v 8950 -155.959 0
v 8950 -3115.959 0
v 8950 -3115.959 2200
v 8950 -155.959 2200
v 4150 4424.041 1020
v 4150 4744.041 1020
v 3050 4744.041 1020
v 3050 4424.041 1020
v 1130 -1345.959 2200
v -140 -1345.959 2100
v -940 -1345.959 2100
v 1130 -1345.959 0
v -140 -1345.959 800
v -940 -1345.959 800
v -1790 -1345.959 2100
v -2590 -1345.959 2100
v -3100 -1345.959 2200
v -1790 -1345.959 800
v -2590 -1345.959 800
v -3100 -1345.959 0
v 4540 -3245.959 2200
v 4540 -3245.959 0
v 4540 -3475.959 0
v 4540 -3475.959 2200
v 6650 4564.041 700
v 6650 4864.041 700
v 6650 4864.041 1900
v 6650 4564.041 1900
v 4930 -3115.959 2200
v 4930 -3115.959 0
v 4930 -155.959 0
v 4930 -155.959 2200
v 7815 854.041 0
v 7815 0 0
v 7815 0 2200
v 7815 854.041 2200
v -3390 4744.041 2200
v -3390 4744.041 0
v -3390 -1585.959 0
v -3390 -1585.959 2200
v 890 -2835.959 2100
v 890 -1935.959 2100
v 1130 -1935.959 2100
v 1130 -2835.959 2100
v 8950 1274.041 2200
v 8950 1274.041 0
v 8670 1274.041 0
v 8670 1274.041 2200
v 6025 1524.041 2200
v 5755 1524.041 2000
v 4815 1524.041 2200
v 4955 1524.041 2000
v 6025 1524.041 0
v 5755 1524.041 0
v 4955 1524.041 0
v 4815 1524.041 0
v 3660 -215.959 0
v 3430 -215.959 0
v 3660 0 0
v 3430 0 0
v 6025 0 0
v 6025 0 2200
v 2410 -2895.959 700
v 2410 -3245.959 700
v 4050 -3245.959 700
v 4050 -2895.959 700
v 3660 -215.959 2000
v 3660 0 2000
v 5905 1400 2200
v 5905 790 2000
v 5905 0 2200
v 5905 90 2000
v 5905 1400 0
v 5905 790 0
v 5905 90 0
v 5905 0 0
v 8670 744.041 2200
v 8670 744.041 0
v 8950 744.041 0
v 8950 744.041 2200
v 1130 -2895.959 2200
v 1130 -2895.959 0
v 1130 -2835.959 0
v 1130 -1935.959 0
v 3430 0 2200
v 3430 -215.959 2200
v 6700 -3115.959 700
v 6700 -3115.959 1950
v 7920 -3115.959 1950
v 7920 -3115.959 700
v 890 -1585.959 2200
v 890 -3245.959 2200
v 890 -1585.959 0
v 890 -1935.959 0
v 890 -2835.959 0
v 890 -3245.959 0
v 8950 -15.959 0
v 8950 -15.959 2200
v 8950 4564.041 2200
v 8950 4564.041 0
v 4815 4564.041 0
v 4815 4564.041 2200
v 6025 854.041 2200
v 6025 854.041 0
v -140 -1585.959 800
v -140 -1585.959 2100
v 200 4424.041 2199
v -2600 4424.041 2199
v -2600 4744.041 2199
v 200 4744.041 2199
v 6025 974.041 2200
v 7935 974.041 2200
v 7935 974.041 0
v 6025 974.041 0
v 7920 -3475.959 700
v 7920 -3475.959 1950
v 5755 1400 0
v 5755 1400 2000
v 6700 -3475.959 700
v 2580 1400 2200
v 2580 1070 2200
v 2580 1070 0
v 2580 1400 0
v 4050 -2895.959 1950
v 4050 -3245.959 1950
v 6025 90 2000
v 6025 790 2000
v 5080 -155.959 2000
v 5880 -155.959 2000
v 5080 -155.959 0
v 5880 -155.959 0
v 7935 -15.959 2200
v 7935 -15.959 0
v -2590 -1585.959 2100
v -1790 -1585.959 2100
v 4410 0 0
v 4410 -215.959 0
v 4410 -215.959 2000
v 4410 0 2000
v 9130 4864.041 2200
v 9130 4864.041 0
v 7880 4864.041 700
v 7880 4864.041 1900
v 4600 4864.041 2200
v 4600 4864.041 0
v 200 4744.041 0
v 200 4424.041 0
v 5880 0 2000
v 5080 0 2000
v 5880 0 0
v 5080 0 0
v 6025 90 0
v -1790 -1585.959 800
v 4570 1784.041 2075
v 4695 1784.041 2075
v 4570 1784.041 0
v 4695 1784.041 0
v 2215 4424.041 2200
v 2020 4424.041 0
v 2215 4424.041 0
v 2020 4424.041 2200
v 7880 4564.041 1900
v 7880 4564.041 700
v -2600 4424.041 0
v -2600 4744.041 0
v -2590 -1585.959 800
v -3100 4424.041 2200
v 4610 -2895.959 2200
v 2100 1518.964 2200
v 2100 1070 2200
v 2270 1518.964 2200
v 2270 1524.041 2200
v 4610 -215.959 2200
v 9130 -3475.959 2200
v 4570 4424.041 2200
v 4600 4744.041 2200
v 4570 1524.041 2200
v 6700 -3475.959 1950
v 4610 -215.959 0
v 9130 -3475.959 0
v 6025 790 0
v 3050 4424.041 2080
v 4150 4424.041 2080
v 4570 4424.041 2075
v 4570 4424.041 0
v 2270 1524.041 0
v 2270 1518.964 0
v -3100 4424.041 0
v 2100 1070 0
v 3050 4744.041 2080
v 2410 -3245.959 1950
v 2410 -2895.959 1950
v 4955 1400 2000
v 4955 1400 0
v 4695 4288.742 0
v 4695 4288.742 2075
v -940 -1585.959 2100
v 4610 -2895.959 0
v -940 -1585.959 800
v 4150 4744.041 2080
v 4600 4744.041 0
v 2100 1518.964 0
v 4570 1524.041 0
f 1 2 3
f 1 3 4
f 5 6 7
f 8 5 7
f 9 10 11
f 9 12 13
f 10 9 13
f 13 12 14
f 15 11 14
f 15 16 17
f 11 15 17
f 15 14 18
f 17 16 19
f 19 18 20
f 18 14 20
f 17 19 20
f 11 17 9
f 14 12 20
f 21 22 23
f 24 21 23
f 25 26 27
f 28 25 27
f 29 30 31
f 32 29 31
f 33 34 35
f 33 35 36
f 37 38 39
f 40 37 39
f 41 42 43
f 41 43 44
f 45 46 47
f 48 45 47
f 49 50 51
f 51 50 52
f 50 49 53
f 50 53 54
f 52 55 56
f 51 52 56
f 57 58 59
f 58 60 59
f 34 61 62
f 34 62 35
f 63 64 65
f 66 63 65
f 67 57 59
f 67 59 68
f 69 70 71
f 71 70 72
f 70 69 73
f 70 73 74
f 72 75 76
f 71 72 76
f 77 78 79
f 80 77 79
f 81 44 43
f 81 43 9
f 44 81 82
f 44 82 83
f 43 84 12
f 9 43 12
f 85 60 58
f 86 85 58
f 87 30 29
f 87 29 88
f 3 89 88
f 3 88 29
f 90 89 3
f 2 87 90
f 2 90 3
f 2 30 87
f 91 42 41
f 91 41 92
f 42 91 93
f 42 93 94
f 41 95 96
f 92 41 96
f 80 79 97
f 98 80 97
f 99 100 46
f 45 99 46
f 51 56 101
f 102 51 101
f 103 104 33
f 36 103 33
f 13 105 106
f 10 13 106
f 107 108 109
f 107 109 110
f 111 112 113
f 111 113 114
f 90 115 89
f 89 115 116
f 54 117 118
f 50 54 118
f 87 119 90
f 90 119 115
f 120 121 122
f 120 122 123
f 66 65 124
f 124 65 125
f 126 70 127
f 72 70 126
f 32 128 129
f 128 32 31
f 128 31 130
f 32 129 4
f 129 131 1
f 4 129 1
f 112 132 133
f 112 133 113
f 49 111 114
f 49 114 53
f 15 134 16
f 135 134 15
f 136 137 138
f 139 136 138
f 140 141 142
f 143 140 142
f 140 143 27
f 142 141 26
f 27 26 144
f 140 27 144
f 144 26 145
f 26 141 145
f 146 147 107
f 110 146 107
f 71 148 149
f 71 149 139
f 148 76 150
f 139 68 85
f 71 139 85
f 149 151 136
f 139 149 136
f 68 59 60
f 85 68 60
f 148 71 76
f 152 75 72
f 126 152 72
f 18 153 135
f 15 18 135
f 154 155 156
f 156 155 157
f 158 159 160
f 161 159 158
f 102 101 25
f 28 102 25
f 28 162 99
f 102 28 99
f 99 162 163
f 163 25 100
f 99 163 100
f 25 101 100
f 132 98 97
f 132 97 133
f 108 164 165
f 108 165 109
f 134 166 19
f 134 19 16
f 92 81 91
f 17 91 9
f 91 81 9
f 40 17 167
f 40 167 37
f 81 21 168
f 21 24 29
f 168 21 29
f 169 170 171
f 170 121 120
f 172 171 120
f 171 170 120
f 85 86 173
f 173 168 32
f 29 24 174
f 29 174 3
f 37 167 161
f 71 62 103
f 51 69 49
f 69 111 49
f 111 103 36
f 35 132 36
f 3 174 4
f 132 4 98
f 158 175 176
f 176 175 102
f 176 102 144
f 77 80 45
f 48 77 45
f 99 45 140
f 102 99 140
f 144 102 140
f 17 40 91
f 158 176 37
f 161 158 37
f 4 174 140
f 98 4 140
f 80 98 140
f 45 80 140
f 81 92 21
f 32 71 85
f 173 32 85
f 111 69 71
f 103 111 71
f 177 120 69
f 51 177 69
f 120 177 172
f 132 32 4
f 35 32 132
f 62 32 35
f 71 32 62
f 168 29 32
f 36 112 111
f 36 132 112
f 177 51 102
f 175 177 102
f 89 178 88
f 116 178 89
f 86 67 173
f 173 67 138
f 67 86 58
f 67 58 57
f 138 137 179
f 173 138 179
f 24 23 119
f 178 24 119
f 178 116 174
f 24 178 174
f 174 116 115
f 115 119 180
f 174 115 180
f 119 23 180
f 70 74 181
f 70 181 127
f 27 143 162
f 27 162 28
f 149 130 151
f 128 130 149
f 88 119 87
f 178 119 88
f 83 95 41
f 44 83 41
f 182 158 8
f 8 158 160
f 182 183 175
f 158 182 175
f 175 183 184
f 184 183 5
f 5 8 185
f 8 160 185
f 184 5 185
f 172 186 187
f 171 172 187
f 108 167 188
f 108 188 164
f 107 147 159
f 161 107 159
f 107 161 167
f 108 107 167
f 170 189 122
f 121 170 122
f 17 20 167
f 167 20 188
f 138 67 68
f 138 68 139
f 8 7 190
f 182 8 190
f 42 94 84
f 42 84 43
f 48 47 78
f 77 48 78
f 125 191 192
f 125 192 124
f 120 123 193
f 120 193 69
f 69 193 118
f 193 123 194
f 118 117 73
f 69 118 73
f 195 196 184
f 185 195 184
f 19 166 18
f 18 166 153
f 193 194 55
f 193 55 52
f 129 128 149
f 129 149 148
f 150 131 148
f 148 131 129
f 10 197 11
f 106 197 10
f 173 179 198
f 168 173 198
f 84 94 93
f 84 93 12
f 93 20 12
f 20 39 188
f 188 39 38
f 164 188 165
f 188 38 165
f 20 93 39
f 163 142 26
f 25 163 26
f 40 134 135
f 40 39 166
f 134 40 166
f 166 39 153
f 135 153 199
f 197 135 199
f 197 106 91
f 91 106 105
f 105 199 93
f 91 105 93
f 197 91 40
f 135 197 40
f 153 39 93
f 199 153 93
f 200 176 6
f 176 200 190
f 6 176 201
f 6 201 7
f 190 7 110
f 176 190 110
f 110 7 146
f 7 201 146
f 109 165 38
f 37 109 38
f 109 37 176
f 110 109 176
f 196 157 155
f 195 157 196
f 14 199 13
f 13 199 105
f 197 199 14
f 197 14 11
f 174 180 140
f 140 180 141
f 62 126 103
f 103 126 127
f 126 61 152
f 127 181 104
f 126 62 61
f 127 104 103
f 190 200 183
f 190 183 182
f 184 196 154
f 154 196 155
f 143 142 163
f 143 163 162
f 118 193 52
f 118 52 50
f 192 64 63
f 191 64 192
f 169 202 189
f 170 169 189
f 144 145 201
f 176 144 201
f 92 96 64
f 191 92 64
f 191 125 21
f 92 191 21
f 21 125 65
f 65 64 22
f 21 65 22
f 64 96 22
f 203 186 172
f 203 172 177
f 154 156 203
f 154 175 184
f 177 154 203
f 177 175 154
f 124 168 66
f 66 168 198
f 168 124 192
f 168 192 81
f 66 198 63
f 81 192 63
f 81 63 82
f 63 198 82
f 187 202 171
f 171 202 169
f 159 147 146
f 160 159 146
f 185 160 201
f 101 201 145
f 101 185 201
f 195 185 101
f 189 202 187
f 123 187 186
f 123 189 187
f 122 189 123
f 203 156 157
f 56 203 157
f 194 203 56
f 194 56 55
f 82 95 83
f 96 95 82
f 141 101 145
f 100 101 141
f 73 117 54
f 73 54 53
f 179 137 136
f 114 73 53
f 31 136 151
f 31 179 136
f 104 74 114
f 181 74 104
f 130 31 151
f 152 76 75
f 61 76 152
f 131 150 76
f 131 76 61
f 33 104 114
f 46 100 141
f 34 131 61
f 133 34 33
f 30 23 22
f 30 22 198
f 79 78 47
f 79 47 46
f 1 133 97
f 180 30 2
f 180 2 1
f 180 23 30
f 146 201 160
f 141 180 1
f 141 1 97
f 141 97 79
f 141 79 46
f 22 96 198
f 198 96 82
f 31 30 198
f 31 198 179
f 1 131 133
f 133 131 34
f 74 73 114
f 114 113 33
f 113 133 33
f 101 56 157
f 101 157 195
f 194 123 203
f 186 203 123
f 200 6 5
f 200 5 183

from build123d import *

# Parameters (mm, degrees)
F0_W      = 4020
F0_H      = 2960
F0_W_2    = 1790
F0_H_2    = 854.041485
F0_W_3    = 2480
F0_H_3    = 2900
F1_DEPTH  = 2200
F2_W      = 2800
F2_H      = 2199
F3_DEPTH  = 350
F4_W      = 2905.077265
F4_H      = 2200
F5_DEPTH  = 250
F6_W      = 990
F6_H      = 2200
F7_DEPTH  = 130
F8_W      = 750
F8_H      = 2000
F9_DEPTH  = 250
F10_W     = 800
F10_H     = 2000
F11_DEPTH = 200
F12_W     = 800
F12_H     = 2000
F13_DEPTH = 200
F14_W     = 800
F14_H     = 1300
F15_DEPTH = 240
F16_W     = 1640
F16_H     = 1250
F17_DEPTH = 350
F18_W     = 1220
F18_H     = 1250
F19_DEPTH = 360
F20_W     = 1230
F20_H     = 1200
F21_DEPTH = 300
F22_W     = 1100
F22_H     = 1060
F23_DEPTH = 320
F24_W     = 900
F24_H     = 2100
F25_DEPTH = 240
F26_W     = 700
F26_H     = 2000
F27_DEPTH = 120
F29_DEPTH = 125
F31_DEPTH = 2075


with BuildPart() as f1:
    # F0 (on Top) → F1 (new body)
    with BuildSketch(Plane.XY):
        Polygon((-3390, -1585.958515), (890, -1585.958515), (890, -3245.958515), (4540, -3245.958515), (4540, -3475.958515), (9130, -3475.958515), (9130, 4864.041485), (4600, 4864.041485), (4600, 4744.041485), (-3390, 4744.041485), align=None)
        with Locations((6940, -1635.958515)):
            Rectangle(F0_W, F0_H, mode=Mode.SUBTRACT)
        with Locations((6920, 427.020742)):
            Rectangle(F0_W_2, F0_H_2, mode=Mode.SUBTRACT)
        Polygon((4610, -215.958515), (4610, -2895.958515), (1130, -2895.958515), (1130, -1345.958515), (-3100, -1345.958515), (-3100, 4424.041485), (2020, 4424.041485), (2020, 1518.96422), (1110, 1518.96422), (1110, 1399.993341), (2100, 1399.993341), (2100, 1070), (2580, 1070), (2580, 1400), (5905, 1400), (5905, 0), (3430, 0), (3430, -215.958515), align=None, mode=Mode.SUBTRACT)
        Polygon((4815, 1524.041485), (4815, 4564.041485), (8950, 4564.041485), (8950, 1274.041485), (8670, 1274.041485), (8670, 744.041485), (8950, 744.041485), (8950, -15.958515), (7935, -15.958515), (7935, 974.041485), (6025, 974.041485), (6025, 1524.041485), align=None, mode=Mode.SUBTRACT)
        with Locations((3455, 2974.041485)):
            Rectangle(F0_W_3, F0_H_3, mode=Mode.SUBTRACT)
    extrude(amount=F1_DEPTH)

    # F2 (on face) → F3 (cut)
    with BuildSketch(Plane.XZ.offset(-4424.041485)):
        with Locations((-1200, 1099.5)):
            Rectangle(F2_W, F2_H)
    extrude(amount=-F3_DEPTH, mode=Mode.SUBTRACT)

    # F4 (on face) → F5 (cut)
    with BuildSketch(Plane(origin=(2020, 0, 0), x_dir=(0, -1, 0), z_dir=(-1, 0, 0))):
        with Locations((-2971.502852, 1100)):
            Rectangle(F4_W, F4_H)
    extrude(amount=-F5_DEPTH, mode=Mode.SUBTRACT)

    # F6 (on face) → F7 (cut)
    with BuildSketch(Plane.XZ.offset(-1399.993341)):
        with Locations((1605, 1100)):
            Rectangle(F6_W, F6_H)
    extrude(amount=-F7_DEPTH, mode=Mode.SUBTRACT)

    # F8 (on face) → F9 (cut)
    with BuildSketch(Plane.XZ.offset(215.958515)):
        with Locations((4035, 1000)):
            Rectangle(F8_W, F8_H)
    extrude(amount=-F9_DEPTH, mode=Mode.SUBTRACT)

    # F10 (on face) → F11 (cut)
    with BuildSketch(Plane.XZ.offset(-1400)):
        with Locations((5355, 1000)):
            Rectangle(F10_W, F10_H)
    extrude(amount=-F11_DEPTH, mode=Mode.SUBTRACT)

    # F12 (on face) → F13 (cut)
    with BuildSketch(Plane.XZ.offset(155.958515)):
        with Locations((5480, 1000)):
            Rectangle(F12_W, F12_H)
    extrude(amount=-F13_DEPTH, mode=Mode.SUBTRACT)

    # F14 (on face) → F15 (cut, through all)
    with BuildSketch(Plane.XZ.offset(1585.958515)):
        with Locations((-2190, 1450)):
            Rectangle(F14_W, F14_H)
        with Locations((-540, 1450)):
            Rectangle(F14_W, F14_H)
    extrude(amount=-F15_DEPTH, mode=Mode.SUBTRACT)

    # F16 (on face) → F17 (cut, through all)
    with BuildSketch(Plane.XZ.offset(3245.958515)):
        with Locations((3230, 1325)):
            Rectangle(F16_W, F16_H)
    extrude(amount=-F17_DEPTH, mode=Mode.SUBTRACT)

    # F18 (on face) → F19 (cut, through all)
    with BuildSketch(Plane.XZ.offset(3475.958515)):
        with Locations((7310, 1325)):
            Rectangle(F18_W, F18_H)
    extrude(amount=-F19_DEPTH, mode=Mode.SUBTRACT)

    # F20 (on face) → F21 (cut, through all)
    with BuildSketch(Plane(origin=(0, 4864.041485, 0), x_dir=(-1, 0, 0), z_dir=(0, 1, 0))):
        with Locations((-7265, 1300)):
            Rectangle(F20_W, F20_H)
    extrude(amount=-F21_DEPTH, mode=Mode.SUBTRACT)

    # F22 (on face) → F23 (cut, through all)
    with BuildSketch(Plane(origin=(0, 4744.041485, 0), x_dir=(-1, 0, 0), z_dir=(0, 1, 0))):
        with Locations((-3600, 1550)):
            Rectangle(F22_W, F22_H)
    extrude(amount=-F23_DEPTH, mode=Mode.SUBTRACT)

    # F24 (on face) → F25 (cut, through all)
    with BuildSketch(Plane(origin=(890, 0, 0), x_dir=(0, -1, 0), z_dir=(-1, 0, 0))):
        with Locations((2385.958515, 1050)):
            Rectangle(F24_W, F24_H)
    extrude(amount=-F25_DEPTH, mode=Mode.SUBTRACT)

    # F26 (on face) → F27 (cut, through all)
    with BuildSketch(Plane(origin=(5905, 0, 0), x_dir=(0, -1, 0), z_dir=(-1, 0, 0))):
        with Locations((-440, 1000)):
            Rectangle(F26_W, F26_H)
    extrude(amount=-F27_DEPTH, mode=Mode.SUBTRACT)

    # F28 (on face) → F29 (join)
    with BuildSketch(Plane(origin=(4695, 0, 0), x_dir=(0, -1, 0), z_dir=(-1, 0, 0))):
        Polygon((-1784.041485, 2075), (-1784.041485, 0), (-1524.041485, 0), (-1524.041485, 2200), (-4424.041485, 2200), (-4424.041485, 2075), align=None)
    extrude(amount=F29_DEPTH)

    # F30 (on face) → F31 (join)
    with BuildSketch(Plane(origin=(0, 0, 2075), x_dir=(1, 0, 0), z_dir=(0, 0, -1))):
        Polygon((4695, -4288.742065), (4570, -4424.041485), (4695, -4424.041485), align=None)
    extrude(amount=F31_DEPTH)


solid = f1.part
